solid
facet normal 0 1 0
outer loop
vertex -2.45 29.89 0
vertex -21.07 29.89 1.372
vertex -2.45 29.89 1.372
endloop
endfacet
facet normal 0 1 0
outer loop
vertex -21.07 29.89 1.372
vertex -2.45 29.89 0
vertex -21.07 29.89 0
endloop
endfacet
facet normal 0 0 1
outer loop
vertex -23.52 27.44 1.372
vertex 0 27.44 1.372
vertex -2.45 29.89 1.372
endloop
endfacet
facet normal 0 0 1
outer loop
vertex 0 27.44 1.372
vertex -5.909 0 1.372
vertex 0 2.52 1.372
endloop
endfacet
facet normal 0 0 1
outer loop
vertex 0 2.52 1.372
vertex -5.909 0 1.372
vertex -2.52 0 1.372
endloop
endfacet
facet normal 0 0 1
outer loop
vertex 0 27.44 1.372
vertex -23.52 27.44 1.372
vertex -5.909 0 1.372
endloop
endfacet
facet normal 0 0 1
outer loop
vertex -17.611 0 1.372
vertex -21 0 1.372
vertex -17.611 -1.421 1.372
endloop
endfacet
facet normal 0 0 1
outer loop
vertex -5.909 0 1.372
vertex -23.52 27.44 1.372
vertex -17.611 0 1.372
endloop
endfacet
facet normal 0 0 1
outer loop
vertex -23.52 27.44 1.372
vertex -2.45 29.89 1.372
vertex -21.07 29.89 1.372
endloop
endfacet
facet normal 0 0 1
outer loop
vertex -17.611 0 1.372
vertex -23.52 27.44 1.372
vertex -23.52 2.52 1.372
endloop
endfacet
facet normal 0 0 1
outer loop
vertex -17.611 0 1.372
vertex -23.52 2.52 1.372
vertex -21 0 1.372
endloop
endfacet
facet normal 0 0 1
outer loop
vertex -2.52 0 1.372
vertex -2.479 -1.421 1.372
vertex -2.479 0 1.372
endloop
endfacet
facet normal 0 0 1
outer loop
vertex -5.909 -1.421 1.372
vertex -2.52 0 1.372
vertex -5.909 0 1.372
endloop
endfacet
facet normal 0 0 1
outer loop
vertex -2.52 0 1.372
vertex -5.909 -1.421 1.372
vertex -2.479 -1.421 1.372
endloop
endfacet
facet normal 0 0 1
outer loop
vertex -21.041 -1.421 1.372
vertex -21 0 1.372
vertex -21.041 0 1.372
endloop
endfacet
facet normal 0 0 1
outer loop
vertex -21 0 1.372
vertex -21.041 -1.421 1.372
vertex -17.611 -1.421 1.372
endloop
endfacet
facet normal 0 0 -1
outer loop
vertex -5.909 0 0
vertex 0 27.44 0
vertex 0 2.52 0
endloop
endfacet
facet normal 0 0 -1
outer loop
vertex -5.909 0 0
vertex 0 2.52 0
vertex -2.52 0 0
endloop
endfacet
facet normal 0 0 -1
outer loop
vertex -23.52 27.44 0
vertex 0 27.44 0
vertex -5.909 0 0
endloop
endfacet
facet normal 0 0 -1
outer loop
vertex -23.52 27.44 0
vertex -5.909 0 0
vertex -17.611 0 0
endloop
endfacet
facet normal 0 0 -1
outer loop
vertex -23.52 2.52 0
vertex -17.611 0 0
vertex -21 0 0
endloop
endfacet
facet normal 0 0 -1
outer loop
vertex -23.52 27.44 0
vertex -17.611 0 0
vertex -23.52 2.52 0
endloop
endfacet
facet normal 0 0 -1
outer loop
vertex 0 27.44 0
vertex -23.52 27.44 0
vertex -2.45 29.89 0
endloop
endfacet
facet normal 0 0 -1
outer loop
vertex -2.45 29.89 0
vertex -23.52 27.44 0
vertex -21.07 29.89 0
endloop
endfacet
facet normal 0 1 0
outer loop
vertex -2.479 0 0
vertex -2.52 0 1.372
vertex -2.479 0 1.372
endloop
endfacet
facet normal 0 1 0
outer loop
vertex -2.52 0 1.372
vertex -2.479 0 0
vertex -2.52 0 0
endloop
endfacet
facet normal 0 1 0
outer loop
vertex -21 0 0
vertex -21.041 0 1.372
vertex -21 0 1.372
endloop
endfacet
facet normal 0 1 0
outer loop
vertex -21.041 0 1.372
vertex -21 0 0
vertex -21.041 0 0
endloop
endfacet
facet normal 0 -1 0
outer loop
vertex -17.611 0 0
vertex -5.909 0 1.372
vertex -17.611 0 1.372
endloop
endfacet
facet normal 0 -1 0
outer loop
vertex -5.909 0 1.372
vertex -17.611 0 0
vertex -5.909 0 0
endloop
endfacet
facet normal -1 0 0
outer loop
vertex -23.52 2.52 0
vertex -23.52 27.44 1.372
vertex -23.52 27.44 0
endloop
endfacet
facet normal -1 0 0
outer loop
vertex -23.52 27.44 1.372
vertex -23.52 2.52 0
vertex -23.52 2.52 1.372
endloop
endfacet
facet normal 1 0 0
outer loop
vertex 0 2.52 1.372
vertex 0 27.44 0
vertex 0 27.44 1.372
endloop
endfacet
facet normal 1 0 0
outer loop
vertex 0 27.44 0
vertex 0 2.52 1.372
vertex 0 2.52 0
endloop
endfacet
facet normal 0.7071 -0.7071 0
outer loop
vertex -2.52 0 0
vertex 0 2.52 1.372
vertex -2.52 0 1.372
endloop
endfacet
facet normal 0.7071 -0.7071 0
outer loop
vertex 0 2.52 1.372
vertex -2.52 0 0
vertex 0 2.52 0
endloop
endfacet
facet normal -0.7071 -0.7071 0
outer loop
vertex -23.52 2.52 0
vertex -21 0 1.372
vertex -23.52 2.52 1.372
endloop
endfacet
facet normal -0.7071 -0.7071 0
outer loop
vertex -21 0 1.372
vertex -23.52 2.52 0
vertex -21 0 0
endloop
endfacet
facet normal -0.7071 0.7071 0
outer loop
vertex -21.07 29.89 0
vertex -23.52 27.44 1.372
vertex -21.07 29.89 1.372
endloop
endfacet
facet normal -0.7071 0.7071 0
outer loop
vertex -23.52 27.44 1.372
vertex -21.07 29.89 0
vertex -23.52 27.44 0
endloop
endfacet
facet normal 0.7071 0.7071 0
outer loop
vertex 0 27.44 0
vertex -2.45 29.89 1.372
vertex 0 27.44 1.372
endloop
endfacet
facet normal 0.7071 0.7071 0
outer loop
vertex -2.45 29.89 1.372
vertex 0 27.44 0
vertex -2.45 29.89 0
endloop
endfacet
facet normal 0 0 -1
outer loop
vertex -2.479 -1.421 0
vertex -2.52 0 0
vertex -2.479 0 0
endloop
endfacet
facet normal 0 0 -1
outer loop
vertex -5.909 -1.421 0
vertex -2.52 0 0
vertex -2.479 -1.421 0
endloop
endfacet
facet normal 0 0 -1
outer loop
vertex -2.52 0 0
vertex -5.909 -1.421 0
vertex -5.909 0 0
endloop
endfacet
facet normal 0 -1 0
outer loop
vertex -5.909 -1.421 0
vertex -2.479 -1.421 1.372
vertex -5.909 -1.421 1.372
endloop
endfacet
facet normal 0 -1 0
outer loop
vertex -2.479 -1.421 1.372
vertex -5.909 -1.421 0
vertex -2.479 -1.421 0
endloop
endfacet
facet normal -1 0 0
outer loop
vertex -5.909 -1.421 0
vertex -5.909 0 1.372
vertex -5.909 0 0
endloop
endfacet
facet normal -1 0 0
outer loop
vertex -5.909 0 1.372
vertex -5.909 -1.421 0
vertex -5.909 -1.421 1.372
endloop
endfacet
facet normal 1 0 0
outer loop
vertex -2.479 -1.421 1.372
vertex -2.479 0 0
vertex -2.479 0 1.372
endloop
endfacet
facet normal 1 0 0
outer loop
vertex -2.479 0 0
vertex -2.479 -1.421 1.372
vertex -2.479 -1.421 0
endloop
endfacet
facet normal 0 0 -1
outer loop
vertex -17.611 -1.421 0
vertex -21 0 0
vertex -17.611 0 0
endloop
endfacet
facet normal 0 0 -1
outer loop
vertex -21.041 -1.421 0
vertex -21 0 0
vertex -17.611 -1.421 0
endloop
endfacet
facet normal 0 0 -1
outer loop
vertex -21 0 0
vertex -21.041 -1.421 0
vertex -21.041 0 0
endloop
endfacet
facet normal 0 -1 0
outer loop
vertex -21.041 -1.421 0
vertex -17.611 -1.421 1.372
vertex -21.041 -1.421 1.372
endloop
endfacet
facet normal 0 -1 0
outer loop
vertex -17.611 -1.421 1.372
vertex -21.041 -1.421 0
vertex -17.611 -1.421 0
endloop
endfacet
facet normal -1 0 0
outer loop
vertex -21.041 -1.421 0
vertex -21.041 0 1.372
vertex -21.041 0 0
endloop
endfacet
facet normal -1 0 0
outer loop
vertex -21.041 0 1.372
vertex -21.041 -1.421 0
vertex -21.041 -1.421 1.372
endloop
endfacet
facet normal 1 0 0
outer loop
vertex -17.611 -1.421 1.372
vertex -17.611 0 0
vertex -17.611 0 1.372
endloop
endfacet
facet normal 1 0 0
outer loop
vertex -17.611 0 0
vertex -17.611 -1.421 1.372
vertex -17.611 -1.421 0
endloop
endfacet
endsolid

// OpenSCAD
// preview[view:south, tilt:top]

// Load a 100x100 pixel image.(images will be stretched to fit). Black and white images are best. Experiment with gray scale. More contrast is more difference in depth. Smooth edges look better
image_file = "icon.dat"; // [image_surface:100x100]

// Enter how thick the emblem will be on the door
emblem_bevel_scale = 1;

module door(scale)
scale([scale, scale, scale]){
{
rotate([0,0,90])
{
difference()
{
	cube([30.5,24,1.4]);
	translate([-4.5,0,-1])rotate([0,0,-45])cube(5);
	translate([-4.5,24,-1])rotate([0,0,-45])cube(5);
	translate([28,24,-1])rotate([0,0,-45])cube(5);
	translate([28,0,-1])rotate([0,0,-45])cube(5);
	translate([-8,-8,-40])cube(40);
}
translate([-1.45,2.53,0]) cube([1.45, 3.5,1.4]);
translate([-1.45,17.97,0]) cube([1.45, 3.5,1.4]);

translate([12+6.5/2,12,1.4])
scale([21/100, 21/100,emblem_bevel_scale])rotate([0,0,-90])surface(file=image_file, center=true, convexity=5);
}
}
}

door(0.98);
